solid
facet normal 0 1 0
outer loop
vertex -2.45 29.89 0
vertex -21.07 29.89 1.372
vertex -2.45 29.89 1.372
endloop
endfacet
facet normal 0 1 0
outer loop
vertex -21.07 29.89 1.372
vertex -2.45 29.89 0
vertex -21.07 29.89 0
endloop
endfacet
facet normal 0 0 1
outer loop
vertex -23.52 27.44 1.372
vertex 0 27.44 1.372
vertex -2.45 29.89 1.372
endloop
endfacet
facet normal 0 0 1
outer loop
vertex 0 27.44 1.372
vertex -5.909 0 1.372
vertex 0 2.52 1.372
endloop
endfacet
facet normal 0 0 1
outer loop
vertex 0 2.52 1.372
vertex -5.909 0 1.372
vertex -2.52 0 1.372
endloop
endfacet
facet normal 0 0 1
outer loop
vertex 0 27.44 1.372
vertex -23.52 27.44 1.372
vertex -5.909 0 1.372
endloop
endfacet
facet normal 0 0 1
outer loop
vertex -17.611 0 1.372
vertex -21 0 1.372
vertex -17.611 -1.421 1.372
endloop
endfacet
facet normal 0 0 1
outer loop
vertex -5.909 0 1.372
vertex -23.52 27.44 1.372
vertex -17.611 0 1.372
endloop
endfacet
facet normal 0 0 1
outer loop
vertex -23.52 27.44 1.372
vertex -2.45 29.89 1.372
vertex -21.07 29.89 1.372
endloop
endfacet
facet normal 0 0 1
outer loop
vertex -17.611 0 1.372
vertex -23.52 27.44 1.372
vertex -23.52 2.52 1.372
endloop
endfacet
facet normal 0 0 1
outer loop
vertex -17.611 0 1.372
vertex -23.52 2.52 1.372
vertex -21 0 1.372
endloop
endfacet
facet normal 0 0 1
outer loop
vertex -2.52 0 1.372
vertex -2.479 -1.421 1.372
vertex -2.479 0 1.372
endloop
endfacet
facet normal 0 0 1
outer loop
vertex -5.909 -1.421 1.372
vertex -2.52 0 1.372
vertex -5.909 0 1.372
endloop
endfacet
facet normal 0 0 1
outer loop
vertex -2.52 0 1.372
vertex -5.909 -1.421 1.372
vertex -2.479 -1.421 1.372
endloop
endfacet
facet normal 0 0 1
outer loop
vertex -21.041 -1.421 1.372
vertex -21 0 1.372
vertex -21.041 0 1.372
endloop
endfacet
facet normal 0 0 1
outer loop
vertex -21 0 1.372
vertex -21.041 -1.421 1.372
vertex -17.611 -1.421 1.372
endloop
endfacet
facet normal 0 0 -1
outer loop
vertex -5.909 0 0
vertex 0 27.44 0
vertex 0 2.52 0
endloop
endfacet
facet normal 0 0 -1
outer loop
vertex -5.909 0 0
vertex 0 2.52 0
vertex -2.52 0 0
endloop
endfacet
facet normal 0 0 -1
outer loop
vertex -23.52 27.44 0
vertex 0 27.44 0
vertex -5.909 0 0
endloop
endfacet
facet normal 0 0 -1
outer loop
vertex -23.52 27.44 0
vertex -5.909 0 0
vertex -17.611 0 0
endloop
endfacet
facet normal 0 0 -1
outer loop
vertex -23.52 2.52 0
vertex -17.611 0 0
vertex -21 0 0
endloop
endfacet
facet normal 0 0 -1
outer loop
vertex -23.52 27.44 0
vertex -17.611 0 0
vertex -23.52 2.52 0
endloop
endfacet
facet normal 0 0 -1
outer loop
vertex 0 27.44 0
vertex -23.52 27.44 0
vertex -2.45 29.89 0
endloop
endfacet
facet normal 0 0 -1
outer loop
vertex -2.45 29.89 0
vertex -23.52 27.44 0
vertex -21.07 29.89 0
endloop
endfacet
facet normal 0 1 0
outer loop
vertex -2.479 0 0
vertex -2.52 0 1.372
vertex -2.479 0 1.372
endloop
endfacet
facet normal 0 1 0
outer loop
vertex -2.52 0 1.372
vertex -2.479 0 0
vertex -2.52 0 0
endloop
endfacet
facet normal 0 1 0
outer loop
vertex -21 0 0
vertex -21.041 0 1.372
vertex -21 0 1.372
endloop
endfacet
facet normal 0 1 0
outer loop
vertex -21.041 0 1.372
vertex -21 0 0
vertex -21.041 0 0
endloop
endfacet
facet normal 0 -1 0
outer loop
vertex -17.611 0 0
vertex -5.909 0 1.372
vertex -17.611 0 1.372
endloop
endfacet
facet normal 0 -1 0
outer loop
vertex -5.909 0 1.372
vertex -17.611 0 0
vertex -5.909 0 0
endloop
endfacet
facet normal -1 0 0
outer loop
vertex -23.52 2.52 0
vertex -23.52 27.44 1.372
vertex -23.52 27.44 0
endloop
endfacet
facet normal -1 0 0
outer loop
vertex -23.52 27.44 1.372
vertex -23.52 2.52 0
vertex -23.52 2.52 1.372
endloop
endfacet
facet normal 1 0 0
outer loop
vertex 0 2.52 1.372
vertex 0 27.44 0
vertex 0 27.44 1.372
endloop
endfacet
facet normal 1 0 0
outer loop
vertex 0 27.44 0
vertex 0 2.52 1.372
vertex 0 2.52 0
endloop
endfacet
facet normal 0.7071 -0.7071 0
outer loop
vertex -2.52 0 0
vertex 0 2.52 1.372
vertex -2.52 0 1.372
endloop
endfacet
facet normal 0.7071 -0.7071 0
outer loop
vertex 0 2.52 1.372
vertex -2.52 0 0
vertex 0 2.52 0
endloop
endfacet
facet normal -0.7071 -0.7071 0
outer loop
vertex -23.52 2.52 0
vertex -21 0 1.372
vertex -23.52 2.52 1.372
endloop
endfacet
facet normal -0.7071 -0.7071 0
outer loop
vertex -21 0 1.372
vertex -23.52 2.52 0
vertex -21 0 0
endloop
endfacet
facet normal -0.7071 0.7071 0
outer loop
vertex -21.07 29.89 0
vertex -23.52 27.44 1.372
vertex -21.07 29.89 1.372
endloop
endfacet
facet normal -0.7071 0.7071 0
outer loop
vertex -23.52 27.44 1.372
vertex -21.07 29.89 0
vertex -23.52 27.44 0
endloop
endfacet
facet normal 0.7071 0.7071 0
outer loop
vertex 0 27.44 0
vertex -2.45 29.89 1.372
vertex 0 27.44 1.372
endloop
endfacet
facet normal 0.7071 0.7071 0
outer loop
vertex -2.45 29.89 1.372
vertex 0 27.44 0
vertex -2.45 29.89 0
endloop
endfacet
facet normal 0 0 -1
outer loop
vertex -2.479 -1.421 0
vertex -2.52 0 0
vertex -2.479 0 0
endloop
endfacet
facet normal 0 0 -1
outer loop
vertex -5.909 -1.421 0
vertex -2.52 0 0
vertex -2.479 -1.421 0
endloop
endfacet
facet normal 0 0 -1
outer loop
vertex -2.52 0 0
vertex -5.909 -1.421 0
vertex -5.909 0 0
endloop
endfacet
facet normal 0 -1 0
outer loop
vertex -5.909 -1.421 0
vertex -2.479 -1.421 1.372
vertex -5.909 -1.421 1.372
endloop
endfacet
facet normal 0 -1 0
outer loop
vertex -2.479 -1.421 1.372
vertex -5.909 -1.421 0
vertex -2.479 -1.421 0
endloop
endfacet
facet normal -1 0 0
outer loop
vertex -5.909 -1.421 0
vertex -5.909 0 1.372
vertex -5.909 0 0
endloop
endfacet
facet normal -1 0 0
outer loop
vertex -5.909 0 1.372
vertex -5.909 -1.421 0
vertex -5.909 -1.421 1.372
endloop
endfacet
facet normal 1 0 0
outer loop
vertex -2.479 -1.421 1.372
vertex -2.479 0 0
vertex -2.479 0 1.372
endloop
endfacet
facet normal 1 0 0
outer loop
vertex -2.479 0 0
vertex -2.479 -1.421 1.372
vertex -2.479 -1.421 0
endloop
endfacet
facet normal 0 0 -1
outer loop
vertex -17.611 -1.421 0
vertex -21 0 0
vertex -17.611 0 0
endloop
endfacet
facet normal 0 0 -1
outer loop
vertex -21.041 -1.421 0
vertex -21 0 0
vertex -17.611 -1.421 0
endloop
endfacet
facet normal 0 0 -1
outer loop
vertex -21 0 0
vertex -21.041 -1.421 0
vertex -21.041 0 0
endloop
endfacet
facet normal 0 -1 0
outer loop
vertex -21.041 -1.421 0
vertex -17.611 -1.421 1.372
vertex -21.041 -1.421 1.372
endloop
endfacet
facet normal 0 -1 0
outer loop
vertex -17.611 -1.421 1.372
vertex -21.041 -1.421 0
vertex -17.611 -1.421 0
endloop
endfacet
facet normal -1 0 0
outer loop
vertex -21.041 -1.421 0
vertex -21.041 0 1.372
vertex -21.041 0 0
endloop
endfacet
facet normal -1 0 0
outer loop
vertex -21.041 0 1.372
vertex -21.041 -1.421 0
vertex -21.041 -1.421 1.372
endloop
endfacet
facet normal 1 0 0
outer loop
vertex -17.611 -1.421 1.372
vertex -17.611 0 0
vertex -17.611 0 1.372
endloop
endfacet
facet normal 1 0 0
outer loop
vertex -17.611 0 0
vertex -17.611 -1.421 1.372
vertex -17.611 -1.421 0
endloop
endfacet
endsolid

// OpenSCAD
// preview[view:south, tilt:top]

// Load a 100x100 pixel image.(images will be stretched to fit). Black and white images are best. Experiment with gray scale. More contrast is more difference in depth. Smooth edges look better
image_file = "icon.dat"; // [image_surface:100x100]

// Enter how thick the emblem will be on the door
emblem_bevel_scale = 1;

module door(scale)
scale([scale, scale, scale]){
{
rotate([0,0,90])
{
difference()
{
	cube([30.5,24,1.4]);
	translate([-4.5,0,-1])rotate([0,0,-45])cube(5);
	translate([-4.5,24,-1])rotate([0,0,-45])cube(5);
	translate([28,24,-1])rotate([0,0,-45])cube(5);
	translate([28,0,-1])rotate([0,0,-45])cube(5);
	translate([-8,-8,-40])cube(40);
}
translate([-1.45,2.53,0]) cube([1.45, 3.5,1.4]);
translate([-1.45,17.97,0]) cube([1.45, 3.5,1.4]);

translate([12+6.5/2,12,1.4])
scale([21/100, 21/100,emblem_bevel_scale])rotate([0,0,-90])surface(file=image_file, center=true, convexity=5);
}
}
}

door(0.98);
